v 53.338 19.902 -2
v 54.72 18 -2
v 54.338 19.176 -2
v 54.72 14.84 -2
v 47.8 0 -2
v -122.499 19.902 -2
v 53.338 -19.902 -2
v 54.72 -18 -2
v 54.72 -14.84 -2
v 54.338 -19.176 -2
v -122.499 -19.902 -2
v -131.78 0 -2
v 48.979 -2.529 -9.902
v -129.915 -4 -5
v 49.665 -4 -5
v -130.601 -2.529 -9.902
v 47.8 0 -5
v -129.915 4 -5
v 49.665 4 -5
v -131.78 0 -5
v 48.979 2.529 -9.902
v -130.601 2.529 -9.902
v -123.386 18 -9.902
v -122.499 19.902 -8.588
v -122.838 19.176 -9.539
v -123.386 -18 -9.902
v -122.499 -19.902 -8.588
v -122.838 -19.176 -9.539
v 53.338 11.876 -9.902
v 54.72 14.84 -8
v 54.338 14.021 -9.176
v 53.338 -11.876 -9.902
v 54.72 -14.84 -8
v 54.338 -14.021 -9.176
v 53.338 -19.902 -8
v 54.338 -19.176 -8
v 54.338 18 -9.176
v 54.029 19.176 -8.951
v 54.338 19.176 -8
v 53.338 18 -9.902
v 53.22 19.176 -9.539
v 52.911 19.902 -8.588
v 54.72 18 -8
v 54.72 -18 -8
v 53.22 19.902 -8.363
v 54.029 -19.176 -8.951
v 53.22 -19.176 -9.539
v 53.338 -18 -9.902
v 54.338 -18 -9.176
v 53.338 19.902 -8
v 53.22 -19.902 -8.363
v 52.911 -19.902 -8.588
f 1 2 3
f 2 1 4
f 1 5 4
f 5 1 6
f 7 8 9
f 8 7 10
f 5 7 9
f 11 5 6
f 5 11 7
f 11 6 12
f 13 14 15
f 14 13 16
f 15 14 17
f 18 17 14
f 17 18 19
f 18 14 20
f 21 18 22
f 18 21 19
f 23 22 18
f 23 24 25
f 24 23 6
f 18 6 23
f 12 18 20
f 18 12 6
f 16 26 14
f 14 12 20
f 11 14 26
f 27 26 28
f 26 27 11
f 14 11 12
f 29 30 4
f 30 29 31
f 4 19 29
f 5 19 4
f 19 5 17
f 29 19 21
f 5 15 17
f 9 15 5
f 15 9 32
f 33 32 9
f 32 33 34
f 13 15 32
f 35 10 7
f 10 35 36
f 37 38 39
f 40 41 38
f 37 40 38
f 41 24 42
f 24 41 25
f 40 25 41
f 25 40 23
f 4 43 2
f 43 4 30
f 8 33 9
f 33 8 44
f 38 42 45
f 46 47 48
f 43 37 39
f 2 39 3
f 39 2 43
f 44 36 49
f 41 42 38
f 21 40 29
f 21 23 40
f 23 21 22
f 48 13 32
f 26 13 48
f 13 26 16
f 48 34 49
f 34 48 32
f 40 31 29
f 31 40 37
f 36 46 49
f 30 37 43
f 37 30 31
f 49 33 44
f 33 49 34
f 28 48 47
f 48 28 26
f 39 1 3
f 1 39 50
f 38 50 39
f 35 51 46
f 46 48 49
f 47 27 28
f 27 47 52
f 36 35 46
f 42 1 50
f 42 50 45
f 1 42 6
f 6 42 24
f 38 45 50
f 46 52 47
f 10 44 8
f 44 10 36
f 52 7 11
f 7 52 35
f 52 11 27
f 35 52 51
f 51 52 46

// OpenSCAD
// file: globals.scad
/*
Most things in this file is represented as one millimeter, so keep that in mind while changing things.
Some of the setting are not mm but at variables that you can set, such as 2*x=2x and you are setting what x is.
I will try to specify when things are variables and not exact measurements.
*/

// printer slop
slop = 0.15;

obj_leg = 30;
leg_length = 5.5;
small_number = 0.001;
metal_core_rode_global = 5;


///////////////// number of holes /////////////////////
z_hole_number = 8;
other_holes = 8;

///////////////// Pins /////////////////////

//pins that poke out
ball_size = 10;
pin_height = 20;
pin_diameter = 6;


//holes
hole_ball_size = ball_size;
hole_pin_height = pin_height;
hole_pin_diameter = pin_diameter;

///////////////// Z THINGS /////////////////////

berring_slot_width = 7.5;
berring_slot_depth = 6.5;
metal_core_rode = 5;

///////////////// X THINGS /////////////////////

//male dove tails
male_dove_max_width=8;
male_dove_min_width=5;
male_dove_depth=5;
male_dove_height=obj_leg/2;

function scaled_male_dove_max_width() = male_dove_max_width - slop;
function scaled_male_dove_min_width() = male_dove_min_width - slop;
function scaled_male_dove_depth() = male_dove_depth - slop;

//female dove tails, this is found on the y mounts
girl_max_width=11;
girl_min_width=5;
girl_depth=5;
girl_height=obj_leg;


///////////////// Y THINGS /////////////////////
/*
The Y is so normal that all of those global variables at the top should change all of the setting in it, this section is set her incase there are variables set in the future development of this project.
*/

// stepper
motor_side_length = 43.2;
motor_bolt_hole_distance = 31;
motor_center_hole = 23;
motor_shaft_dia = 5;
motor_shaft_hole_dia = 5+2*slop;

// bolts etc.
bolt_hole_dia = 3+2*slop;
bolt_head_hole_dia = 5.8;

m4_bolt_hole_dia = 4+2*slop;
m4_bolt_head_hole_dia = 6.8+2*slop;


m3_nut_side = 5.65;
m3_nut_height = 2.3;
m4_nut_side = 6.85;
m4_nut_height = 3.1;

// threaded rod
lifter_rod_diam = 9.86;
hole_threaded_rod = lifter_rod_diam+2*slop;

// for the extensions
metal_rod_size = 9;
// main file
include <include.scad>;
include <globals.scad>;


//globals

obj_height = 40;
units = 6; //only even numbers
unit_length = 29.93;
tail_depth = 8;
tie_scale_x = 1;
tie_scale_y = 1;
tie_scale_z = 1;

resolution = 10;

teeth_angle = 25;


//good things
module rounded_cube(width,depth,height){
    hull(){
        translate([width/2-diamiter/2,depth/2-diamiter/2,height/2-diamiter/2]) sphere(d=diamiter);
        translate([width/2-(diamiter/2),depth/2-(diamiter/2),-height/2+(diamiter/2)]) sphere(d=diamiter);
        translate([-width/2+diamiter/2,depth/2-diamiter/2,height/2-diamiter/2]) sphere(d=diamiter);
        translate([-width/2+(diamiter/2),depth/2-(diamiter/2),-height/2+(diamiter/2)]) sphere(d=diamiter);
        
        translate([width/2-diamiter/2,-depth/2+diamiter/2,height/2-diamiter/2]) sphere(d=diamiter);
        translate([width/2-(diamiter/2),-depth/2+(diamiter/2),-height/2+(diamiter/2)]) sphere(d=diamiter);
        translate([-width/2+diamiter/2,-depth/2+diamiter/2,height/2-diamiter/2]) sphere(d=diamiter);
        translate([-width/2+(diamiter/2),-depth/2+(diamiter/2),-height/2+(diamiter/2)]) sphere(d=diamiter);
    }
}  

module tie_taken(){
    difference(){
        translate([0,tail_depth,0]) rotate([0,90,180]) scale([tie_scale_x,tie_scale_z,tie_scale_y])  male_dovetail(height=30);
	}
}

module rackHalf(){
    intersection() {
        union() {
            translate([0,0,-10]) rotate(a=[0,-teeth_angle,0]) {
                linear_extrude(height = obj_height*1, center = true, convexity = 10)
                import (file = "rack.dxf", layer = "Layer_1");
            }
        }
        translate([1, 0, obj_height/-4]) cube(center = true, [50, 20, obj_height/2]);
    }
}
module rackFull(){
    intersection() {
        union() {
            mirror([0,0,1]) rackHalf();
            rackHalf();
        }
        union() {
            cube(center = true, [50, 10, obj_height-8]);

        }
    }
}

//herring bone style rack made from inkscape and OpenScad
module rackObject() {



    for(rack_length=[-units:units]){
        translate([rack_length*unit_length,0,0]) {
					intersection(){
						rackFull();
						scale([1,.25,1]) translate([0,5,0]) rotate([0,90,0]) cylinder(r=15, h=40, center=true);
					}
		}
	}

	for(rack_length=[-units:units]){
		difference(){
			translate([unit_length*rack_length+15,6,0]) cube([unit_length,8,40], center=true);
		}
	}
}
diamiter = 4;

//translate([0,30,0]) rackHalf();

end_offset = 47.8;
head_offset = end_offset - unit_length;

intersection(){
//translate([0,0,-10]) cube([20,20,20]);
	intersection(){
		rotate([-90,0,0]) translate([-10-((units-2)*15),0,0]) translate([unit_length,0,0]) rounded_cube(unit_length*units+10,20,40,$fn=resolution);
        union(){
            rotate([-90,0,0]) intersection(){
                difference(){
                    rackObject();
                    for(rack_length=[-units:1]){
						translate([30*rack_length+30,2,0]) tie_taken();
                    }
                }

                difference(){
                    union(){
                        translate([-(units-4)*unit_length/2,0,0]) rounded_cube(30*units,20,40,$fn=50);
                        translate([end_offset-(units*unit_length),-5,0]) rotate([0,teeth_angle,0]) cube([30,30,30]);
                        mirror([0,0,1]) translate([end_offset-(units*unit_length),-5,0]) rotate([0,teeth_angle,0]) cube([30,30,30]);
                    }
                    union(){
                        translate([end_offset,-5,0]) rotate([0,teeth_angle,0]) cube([30,30,30]);
                        mirror([0,0,1]) translate([end_offset,-5,0]) rotate([0,teeth_angle,0]) cube([30,30,30]);
                    }
                }
            //intersection
            }
        //union
        }
	//intersection
	}
//intersection
}
